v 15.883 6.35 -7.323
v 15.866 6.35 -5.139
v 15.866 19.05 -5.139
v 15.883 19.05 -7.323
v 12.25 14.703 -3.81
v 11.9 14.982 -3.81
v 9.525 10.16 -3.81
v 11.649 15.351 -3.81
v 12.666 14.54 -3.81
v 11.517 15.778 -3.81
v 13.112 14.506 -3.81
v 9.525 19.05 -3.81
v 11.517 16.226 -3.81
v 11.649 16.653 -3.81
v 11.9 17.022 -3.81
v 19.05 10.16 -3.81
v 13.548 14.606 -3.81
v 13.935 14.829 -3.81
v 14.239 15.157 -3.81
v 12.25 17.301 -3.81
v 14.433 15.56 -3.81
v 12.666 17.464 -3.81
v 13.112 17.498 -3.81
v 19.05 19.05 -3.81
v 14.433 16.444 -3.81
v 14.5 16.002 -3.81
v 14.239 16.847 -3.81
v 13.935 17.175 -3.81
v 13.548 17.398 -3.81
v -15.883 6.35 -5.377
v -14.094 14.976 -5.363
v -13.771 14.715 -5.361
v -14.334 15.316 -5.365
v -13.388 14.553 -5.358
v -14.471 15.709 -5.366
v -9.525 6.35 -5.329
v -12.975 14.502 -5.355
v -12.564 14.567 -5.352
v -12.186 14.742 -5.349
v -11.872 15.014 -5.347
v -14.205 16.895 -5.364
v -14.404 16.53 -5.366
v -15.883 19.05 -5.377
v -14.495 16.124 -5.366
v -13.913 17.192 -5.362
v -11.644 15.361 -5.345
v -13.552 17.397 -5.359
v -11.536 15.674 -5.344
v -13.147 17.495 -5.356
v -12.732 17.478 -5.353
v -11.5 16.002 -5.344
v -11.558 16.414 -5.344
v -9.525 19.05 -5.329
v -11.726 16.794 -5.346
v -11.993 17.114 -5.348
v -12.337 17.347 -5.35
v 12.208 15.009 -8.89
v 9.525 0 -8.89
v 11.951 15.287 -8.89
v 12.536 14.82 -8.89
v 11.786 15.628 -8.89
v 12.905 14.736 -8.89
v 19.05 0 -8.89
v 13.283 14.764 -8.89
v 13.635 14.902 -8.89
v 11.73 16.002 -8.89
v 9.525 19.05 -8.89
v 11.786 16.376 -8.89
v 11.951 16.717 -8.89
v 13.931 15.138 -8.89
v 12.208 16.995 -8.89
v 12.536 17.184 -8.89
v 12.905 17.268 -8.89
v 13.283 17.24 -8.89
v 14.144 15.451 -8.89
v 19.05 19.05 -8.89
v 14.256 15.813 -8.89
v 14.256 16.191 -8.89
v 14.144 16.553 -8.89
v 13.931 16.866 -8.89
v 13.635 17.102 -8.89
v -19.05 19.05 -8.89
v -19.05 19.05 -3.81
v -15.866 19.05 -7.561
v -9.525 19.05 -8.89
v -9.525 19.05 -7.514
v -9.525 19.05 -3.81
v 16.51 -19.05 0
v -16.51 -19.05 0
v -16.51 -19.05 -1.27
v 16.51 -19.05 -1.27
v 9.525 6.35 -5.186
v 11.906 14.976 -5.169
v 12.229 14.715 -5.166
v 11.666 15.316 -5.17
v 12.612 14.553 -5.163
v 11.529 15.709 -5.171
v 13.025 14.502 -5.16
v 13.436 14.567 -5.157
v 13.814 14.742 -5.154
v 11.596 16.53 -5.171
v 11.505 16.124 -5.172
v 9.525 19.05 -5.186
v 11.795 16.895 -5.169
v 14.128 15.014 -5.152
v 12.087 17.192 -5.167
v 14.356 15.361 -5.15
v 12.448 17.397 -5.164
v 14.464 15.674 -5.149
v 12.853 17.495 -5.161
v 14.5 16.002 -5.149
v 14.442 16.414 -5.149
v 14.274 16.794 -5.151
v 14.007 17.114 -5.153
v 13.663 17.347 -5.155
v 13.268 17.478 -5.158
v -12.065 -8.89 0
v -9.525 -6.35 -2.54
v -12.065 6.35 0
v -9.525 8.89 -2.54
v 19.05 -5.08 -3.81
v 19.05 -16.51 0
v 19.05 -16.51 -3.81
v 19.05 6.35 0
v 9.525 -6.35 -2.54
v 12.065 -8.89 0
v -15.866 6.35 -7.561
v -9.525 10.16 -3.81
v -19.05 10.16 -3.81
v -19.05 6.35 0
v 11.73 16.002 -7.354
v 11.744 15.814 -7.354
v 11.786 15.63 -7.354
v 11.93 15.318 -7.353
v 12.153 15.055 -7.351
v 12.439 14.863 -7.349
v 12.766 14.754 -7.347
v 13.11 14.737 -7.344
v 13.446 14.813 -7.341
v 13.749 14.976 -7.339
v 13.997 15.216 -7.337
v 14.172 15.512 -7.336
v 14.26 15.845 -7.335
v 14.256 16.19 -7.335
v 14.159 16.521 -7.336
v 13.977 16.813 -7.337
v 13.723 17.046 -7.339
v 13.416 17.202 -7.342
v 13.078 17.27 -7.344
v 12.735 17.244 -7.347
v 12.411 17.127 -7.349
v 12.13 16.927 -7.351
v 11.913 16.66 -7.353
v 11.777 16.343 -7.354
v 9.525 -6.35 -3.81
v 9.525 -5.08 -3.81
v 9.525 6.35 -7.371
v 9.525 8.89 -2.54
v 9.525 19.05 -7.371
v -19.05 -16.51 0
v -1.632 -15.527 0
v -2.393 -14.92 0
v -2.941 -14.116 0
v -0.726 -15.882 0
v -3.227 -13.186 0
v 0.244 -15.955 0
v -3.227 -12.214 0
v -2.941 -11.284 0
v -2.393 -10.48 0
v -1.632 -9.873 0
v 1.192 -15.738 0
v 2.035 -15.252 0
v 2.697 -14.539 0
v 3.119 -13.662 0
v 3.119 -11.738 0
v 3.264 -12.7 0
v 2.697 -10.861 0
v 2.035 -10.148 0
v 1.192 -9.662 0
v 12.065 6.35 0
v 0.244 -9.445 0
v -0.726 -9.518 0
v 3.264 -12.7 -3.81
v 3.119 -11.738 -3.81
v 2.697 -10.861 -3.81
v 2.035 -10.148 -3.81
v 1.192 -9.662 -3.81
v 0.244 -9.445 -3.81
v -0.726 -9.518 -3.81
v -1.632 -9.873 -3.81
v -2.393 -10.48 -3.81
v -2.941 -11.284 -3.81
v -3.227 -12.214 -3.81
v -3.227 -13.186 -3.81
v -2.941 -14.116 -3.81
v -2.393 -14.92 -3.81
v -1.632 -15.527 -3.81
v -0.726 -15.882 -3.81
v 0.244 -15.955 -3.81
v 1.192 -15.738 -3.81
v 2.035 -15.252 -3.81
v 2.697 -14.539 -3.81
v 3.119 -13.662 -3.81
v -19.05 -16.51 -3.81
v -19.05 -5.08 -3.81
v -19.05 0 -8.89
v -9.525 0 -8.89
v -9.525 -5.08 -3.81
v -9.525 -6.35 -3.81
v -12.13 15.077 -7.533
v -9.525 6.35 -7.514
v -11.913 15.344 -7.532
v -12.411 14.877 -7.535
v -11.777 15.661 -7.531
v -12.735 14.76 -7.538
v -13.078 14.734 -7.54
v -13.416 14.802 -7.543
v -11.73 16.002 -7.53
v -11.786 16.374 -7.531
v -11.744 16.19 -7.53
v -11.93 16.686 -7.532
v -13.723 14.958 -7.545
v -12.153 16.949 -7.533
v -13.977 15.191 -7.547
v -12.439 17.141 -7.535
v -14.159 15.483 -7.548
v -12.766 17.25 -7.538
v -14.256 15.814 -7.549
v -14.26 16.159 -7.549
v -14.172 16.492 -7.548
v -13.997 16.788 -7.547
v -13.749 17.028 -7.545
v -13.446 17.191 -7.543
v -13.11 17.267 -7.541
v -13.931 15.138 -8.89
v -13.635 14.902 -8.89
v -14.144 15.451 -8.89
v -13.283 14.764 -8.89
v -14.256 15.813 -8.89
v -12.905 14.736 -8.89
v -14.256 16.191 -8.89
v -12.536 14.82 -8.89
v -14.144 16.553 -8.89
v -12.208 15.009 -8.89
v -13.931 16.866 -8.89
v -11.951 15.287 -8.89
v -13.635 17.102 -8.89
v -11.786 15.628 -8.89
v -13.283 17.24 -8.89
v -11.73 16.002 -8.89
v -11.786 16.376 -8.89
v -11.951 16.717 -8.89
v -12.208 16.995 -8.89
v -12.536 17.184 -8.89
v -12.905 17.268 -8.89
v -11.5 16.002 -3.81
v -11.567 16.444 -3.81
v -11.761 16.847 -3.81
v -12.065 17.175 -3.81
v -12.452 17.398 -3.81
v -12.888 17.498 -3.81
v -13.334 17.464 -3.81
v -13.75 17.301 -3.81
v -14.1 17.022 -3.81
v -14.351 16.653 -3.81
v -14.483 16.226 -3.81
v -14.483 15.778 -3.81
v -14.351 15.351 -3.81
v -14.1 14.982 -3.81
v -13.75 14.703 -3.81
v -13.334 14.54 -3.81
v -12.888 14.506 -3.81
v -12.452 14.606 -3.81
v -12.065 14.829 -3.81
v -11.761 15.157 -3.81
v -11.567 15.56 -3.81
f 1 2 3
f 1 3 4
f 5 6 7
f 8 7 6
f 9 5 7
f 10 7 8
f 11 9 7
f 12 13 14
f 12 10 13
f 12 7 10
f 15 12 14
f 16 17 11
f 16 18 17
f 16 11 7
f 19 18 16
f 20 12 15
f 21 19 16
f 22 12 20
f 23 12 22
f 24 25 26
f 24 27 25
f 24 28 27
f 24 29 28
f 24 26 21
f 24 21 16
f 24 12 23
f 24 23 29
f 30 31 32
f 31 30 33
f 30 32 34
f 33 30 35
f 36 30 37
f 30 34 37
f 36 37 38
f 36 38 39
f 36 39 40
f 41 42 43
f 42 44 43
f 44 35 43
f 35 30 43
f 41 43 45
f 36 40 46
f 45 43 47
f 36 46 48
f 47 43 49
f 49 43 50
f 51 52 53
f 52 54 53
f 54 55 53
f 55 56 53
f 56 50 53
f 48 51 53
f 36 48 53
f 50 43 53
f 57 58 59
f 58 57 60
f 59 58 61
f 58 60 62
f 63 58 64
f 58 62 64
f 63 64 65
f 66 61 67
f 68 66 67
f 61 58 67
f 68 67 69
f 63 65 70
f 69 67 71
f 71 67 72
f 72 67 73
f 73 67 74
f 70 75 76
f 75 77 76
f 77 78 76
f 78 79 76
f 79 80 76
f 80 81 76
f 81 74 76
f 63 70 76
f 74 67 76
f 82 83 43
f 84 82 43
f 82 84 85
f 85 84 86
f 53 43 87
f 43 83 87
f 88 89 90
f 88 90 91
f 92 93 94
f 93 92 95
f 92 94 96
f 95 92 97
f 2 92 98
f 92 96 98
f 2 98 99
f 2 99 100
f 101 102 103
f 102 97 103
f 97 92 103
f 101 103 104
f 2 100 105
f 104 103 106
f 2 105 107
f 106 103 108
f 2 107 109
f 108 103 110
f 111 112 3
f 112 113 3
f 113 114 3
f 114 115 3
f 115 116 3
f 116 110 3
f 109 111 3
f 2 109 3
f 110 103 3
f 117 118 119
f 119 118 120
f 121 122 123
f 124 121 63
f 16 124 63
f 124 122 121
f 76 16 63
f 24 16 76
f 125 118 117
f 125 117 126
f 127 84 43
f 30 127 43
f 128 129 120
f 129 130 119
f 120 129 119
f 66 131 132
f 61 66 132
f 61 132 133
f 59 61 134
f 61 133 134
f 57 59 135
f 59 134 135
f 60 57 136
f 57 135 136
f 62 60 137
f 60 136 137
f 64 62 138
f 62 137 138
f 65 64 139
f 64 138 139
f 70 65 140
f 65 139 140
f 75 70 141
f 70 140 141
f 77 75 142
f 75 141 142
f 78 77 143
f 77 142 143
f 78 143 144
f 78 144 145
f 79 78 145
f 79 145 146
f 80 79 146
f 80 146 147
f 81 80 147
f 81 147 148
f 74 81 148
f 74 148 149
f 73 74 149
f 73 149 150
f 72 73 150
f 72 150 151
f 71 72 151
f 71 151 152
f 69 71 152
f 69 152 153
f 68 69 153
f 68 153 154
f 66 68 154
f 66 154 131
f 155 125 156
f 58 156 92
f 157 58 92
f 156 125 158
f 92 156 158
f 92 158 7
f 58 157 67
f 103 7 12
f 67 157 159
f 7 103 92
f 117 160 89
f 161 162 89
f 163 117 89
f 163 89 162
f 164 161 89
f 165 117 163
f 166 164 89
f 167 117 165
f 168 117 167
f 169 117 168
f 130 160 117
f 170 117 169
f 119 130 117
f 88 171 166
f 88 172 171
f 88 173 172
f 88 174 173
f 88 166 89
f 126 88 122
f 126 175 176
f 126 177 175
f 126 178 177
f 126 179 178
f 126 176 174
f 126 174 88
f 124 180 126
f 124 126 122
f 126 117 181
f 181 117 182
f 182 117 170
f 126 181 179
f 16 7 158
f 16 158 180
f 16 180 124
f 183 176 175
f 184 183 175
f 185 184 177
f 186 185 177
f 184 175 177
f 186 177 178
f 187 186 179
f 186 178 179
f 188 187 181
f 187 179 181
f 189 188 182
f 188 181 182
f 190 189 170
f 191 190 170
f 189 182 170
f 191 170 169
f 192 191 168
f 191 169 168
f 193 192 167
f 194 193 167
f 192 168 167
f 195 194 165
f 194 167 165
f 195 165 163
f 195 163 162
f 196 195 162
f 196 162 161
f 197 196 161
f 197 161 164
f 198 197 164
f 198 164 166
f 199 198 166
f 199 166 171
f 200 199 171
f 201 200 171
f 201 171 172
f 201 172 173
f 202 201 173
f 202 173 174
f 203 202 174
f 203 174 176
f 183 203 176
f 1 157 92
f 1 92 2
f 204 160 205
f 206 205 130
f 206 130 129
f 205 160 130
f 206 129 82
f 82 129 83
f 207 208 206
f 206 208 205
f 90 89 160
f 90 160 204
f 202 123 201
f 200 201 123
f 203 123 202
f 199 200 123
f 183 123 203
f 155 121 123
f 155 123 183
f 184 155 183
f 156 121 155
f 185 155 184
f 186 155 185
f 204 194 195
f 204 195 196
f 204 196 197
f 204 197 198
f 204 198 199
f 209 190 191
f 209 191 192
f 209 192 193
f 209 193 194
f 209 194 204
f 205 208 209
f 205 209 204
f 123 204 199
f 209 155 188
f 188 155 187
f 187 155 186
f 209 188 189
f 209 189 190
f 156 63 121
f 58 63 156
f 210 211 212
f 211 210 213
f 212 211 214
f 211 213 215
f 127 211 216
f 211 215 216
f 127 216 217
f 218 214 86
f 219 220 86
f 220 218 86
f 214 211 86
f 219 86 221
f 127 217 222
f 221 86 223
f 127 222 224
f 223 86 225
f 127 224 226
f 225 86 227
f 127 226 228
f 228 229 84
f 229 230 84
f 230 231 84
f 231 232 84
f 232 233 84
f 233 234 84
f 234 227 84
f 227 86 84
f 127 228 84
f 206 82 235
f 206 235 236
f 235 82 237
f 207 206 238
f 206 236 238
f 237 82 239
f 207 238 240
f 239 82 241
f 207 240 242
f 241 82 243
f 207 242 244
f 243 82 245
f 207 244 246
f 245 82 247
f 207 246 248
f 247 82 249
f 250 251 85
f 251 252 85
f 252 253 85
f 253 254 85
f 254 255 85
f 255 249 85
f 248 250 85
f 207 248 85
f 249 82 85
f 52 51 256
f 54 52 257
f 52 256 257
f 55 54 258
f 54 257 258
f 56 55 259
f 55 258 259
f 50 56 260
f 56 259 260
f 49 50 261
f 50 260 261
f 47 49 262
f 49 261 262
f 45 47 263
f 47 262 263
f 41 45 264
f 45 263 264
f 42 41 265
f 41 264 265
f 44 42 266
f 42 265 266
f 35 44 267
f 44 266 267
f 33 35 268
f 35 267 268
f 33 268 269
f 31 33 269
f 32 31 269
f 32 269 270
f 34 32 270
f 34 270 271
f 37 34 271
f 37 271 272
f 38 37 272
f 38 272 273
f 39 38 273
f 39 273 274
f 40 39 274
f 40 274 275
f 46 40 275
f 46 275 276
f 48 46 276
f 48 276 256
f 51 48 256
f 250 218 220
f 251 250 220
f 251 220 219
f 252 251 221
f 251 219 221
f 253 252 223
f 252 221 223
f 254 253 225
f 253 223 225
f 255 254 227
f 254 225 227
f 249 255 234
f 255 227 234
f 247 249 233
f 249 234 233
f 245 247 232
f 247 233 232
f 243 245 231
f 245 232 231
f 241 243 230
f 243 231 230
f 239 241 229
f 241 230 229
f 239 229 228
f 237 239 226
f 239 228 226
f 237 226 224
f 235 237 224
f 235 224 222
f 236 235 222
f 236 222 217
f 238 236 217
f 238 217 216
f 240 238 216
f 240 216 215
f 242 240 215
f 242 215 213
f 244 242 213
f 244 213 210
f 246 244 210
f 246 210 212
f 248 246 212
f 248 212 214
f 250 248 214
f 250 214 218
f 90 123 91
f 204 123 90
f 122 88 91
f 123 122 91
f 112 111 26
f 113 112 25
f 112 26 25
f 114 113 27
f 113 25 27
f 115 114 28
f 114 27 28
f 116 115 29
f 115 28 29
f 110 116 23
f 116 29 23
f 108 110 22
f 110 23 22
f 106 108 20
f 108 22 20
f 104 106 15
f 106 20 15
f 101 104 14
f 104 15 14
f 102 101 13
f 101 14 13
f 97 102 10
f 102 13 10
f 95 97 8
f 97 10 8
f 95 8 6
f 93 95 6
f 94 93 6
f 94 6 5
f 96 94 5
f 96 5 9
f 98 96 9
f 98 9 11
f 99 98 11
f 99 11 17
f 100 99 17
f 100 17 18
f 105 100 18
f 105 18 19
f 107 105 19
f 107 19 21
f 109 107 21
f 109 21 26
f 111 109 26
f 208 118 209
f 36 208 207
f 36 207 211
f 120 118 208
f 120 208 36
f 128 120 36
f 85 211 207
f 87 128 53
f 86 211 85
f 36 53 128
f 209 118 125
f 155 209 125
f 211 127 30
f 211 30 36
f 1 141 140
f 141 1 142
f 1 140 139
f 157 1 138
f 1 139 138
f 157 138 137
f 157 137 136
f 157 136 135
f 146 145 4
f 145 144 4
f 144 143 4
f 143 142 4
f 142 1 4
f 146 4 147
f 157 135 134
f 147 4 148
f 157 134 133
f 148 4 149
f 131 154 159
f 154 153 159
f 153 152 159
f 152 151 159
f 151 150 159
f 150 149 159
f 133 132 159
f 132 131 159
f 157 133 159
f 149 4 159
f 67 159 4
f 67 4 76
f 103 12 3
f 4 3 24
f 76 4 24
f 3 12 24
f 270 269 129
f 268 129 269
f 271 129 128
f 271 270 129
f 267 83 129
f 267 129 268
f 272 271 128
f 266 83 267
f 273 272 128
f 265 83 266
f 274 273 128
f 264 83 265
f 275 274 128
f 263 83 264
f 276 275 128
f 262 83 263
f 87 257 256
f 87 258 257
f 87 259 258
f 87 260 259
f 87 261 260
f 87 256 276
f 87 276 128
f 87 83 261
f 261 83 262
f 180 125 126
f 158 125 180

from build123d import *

# Parameters (mm, degrees)
SKETCH1_W           = 38.1
SKETCH1_H           = 38.1
BOSS_EXTRUDE1_DEPTH = 8.89
SKETCH3_W           = 38.1
SKETCH3_H           = 12.7
CUT_EXTRUDE1_DEPTH  = 3.81
SKETCH4_R           = 1.27
CUT_EXTRUDE2_DEPTH  = 28.415532094
SKETCH6_W           = 19.05
SKETCH6_H           = 31.75
CUT_EXTRUDE5_DEPTH  = 29.369651038
CUT_EXTRUDE6_DEPTH  = 12.7
SKETCH8_W           = 38.1
SKETCH8_H           = 19.05
CUT_EXTRUDE7_DEPTH  = 5.08
SKETCH9_R           = 3.2639
CUT_EXTRUDE8_DEPTH  = 29.369651038
CUT_EXTRUDE9_REACH  = 29.416
SKETCH10_R          = 1.5
CHAMFER6_SIZE       = 5.08
CHAMFER7_SIZE       = 3.81
CHAMFER8_SIZE       = 2.54
CHAMFER9_SIZE       = 2.54


with BuildPart() as part:
    # Sketch1 → Boss-Extrude1 (new body)
    with BuildSketch(Plane.XY):
        Rectangle(SKETCH1_W, SKETCH1_H)
    extrude(amount=-BOSS_EXTRUDE1_DEPTH)

    # Sketch3 → Cut-Extrude1 (cut)
    with BuildSketch(Plane.XY):
        with Locations((0, 12.7)):
            Rectangle(SKETCH3_W, SKETCH3_H)
    extrude(amount=-CUT_EXTRUDE1_DEPTH, mode=Mode.SUBTRACT)

    # Sketch4 → Cut-Extrude2 (cut, through all)
    with BuildSketch(Plane.XY.offset(-3.81)):
        with Locations((-13, 16.002)):
            Circle(SKETCH4_R)
        with Locations(Location((13, 16.002, 0), (0, 0, 180))):
            Circle(SKETCH4_R)
    extrude(amount=-CUT_EXTRUDE2_DEPTH, mode=Mode.SUBTRACT)

    # Sketch6 → Cut-Extrude5 (cut, through all)
    with BuildSketch(Plane.XY):
        with Locations((0, 9.525)):
            Rectangle(SKETCH6_W, SKETCH6_H)
    extrude(amount=-CUT_EXTRUDE5_DEPTH, mode=Mode.SUBTRACT)

    # Sketch7 → Cut-Extrude6 (cut)
    with BuildSketch(Plane(origin=(0, 19.05, 0), x_dir=(1, 0, 0), z_dir=(0, 1, 0))):
        Polygon((15.882742773, 7.323143279), (-15.866364793, 7.561195322), (-15.882742773, 5.376856721), (15.866364793, 5.138804678), align=None)
    extrude(amount=-CUT_EXTRUDE6_DEPTH, mode=Mode.SUBTRACT)

    # Sketch8 → Cut-Extrude7 (cut)
    with BuildSketch(Plane(origin=(0, 0, -8.89), x_dir=(-1, 0, 0), z_dir=(0, 0, -1))):
        with Locations((0, -9.525)):
            Rectangle(SKETCH8_W, SKETCH8_H)
    extrude(amount=-CUT_EXTRUDE7_DEPTH, mode=Mode.SUBTRACT)

    # Sketch9 → Cut-Extrude8 (cut, through all)
    with BuildSketch(Plane.XY):
        with Locations((0, -12.7)):
            Circle(SKETCH9_R)
    extrude(amount=-CUT_EXTRUDE8_DEPTH, mode=Mode.SUBTRACT)

    # Cut-Extrude9: up to this plane
    cut_extrude9_end = Plane(origin=(15.866364793, 6.35, -5.138804678), z_dir=(-0.007497702129822743, 0, 0.9999718918363518))
    # Sketch10 → Cut-Extrude9 (cut, up to the surface)
    with BuildSketch(Plane.XY.offset(-3.81), mode=Mode.PRIVATE) as cut_extrude9_sk1:
        with Locations((-13, 16.002)):
            Circle(SKETCH10_R)
    cut_extrude9_tool1 = split(extrude(cut_extrude9_sk1.sketch, amount=-CUT_EXTRUDE9_REACH, mode=Mode.PRIVATE), bisect_by=cut_extrude9_end, keep=Keep.BOTH, mode=Mode.PRIVATE)
    add(cut_extrude9_tool1.solids().sort_by_distance((-13, 16.002, -3.81))[0], mode=Mode.SUBTRACT)
    # Sketch10 → Cut-Extrude9 (cut, up to the surface)
    with BuildSketch(Plane.XY.offset(-3.81), mode=Mode.PRIVATE) as cut_extrude9_sk2:
        with Locations((13, 16.002)):
            Circle(SKETCH10_R)
    cut_extrude9_tool2 = split(extrude(cut_extrude9_sk2.sketch, amount=-CUT_EXTRUDE9_REACH, mode=Mode.PRIVATE), bisect_by=cut_extrude9_end, keep=Keep.BOTH, mode=Mode.PRIVATE)
    add(cut_extrude9_tool2.solids().sort_by_distance((13, 16.002, -3.81))[0], mode=Mode.SUBTRACT)

    # Chamfer6
    chamfer6_edges = [part.edges().sort_by_distance(p)[0] for p in [
        (-14.2875, 0, -3.81),
        (14.2875, 0, -3.81),
    ]]
    chamfer(chamfer6_edges, length=CHAMFER6_SIZE - 0.0001)  # a hair under: the kernel refuses the full size

    # Chamfer7
    chamfer7_edges = [part.edges().sort_by_distance(p)[0] for p in [
        (-14.2875, 6.35, -3.81),
        (14.2875, 6.35, -3.81),
    ]]
    chamfer(chamfer7_edges, length=CHAMFER7_SIZE - 0.0001)  # a hair under: the kernel refuses the full size

    # Chamfer8
    chamfer8_edges = [part.edges().sort_by_distance(p)[0] for p in [
        (-9.525, 0, 0),
        (0, -6.35, 0),
        (9.525, 0, 0),
    ]]
    chamfer(chamfer8_edges, length=CHAMFER8_SIZE)

    # Chamfer9
    chamfer9_edges = [part.edges().sort_by_distance(p)[0] for p in [
        (-19.05, -19.05, -1.905),
        (19.05, -19.05, -1.905),
        (0, -19.05, -3.81),
    ]]
    chamfer(chamfer9_edges, length=CHAMFER9_SIZE)


solid = part.part
